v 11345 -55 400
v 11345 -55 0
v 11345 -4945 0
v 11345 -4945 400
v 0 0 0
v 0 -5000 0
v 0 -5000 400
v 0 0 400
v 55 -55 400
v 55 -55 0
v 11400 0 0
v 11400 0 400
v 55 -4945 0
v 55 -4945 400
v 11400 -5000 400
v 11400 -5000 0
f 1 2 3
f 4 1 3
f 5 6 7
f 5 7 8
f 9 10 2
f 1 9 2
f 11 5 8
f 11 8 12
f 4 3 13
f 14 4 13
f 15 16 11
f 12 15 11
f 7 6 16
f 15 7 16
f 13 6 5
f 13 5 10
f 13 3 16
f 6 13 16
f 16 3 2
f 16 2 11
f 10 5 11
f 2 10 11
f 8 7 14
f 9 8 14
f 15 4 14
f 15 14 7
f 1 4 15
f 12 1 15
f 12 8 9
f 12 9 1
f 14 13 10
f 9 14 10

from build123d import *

# Parameters (mm, degrees)
F0_W     = 11400
F0_H     = 5000
F1_DEPTH = 400


with BuildPart() as f1:
    # F0 (on Top) → F1 (new body)
    with BuildSketch(Plane.XY):
        with Locations((5700, -2500)):
            Rectangle(F0_W, F0_H)
        Polygon((55, -4945), (55, -55), (4605.61245, -55), (4795.61245, -55), (11345, -55), (11345, -4945), (4795.61245, -4945), (4605.61245, -4945), align=None, mode=Mode.SUBTRACT)
    extrude(amount=F1_DEPTH)


solid = f1.part
